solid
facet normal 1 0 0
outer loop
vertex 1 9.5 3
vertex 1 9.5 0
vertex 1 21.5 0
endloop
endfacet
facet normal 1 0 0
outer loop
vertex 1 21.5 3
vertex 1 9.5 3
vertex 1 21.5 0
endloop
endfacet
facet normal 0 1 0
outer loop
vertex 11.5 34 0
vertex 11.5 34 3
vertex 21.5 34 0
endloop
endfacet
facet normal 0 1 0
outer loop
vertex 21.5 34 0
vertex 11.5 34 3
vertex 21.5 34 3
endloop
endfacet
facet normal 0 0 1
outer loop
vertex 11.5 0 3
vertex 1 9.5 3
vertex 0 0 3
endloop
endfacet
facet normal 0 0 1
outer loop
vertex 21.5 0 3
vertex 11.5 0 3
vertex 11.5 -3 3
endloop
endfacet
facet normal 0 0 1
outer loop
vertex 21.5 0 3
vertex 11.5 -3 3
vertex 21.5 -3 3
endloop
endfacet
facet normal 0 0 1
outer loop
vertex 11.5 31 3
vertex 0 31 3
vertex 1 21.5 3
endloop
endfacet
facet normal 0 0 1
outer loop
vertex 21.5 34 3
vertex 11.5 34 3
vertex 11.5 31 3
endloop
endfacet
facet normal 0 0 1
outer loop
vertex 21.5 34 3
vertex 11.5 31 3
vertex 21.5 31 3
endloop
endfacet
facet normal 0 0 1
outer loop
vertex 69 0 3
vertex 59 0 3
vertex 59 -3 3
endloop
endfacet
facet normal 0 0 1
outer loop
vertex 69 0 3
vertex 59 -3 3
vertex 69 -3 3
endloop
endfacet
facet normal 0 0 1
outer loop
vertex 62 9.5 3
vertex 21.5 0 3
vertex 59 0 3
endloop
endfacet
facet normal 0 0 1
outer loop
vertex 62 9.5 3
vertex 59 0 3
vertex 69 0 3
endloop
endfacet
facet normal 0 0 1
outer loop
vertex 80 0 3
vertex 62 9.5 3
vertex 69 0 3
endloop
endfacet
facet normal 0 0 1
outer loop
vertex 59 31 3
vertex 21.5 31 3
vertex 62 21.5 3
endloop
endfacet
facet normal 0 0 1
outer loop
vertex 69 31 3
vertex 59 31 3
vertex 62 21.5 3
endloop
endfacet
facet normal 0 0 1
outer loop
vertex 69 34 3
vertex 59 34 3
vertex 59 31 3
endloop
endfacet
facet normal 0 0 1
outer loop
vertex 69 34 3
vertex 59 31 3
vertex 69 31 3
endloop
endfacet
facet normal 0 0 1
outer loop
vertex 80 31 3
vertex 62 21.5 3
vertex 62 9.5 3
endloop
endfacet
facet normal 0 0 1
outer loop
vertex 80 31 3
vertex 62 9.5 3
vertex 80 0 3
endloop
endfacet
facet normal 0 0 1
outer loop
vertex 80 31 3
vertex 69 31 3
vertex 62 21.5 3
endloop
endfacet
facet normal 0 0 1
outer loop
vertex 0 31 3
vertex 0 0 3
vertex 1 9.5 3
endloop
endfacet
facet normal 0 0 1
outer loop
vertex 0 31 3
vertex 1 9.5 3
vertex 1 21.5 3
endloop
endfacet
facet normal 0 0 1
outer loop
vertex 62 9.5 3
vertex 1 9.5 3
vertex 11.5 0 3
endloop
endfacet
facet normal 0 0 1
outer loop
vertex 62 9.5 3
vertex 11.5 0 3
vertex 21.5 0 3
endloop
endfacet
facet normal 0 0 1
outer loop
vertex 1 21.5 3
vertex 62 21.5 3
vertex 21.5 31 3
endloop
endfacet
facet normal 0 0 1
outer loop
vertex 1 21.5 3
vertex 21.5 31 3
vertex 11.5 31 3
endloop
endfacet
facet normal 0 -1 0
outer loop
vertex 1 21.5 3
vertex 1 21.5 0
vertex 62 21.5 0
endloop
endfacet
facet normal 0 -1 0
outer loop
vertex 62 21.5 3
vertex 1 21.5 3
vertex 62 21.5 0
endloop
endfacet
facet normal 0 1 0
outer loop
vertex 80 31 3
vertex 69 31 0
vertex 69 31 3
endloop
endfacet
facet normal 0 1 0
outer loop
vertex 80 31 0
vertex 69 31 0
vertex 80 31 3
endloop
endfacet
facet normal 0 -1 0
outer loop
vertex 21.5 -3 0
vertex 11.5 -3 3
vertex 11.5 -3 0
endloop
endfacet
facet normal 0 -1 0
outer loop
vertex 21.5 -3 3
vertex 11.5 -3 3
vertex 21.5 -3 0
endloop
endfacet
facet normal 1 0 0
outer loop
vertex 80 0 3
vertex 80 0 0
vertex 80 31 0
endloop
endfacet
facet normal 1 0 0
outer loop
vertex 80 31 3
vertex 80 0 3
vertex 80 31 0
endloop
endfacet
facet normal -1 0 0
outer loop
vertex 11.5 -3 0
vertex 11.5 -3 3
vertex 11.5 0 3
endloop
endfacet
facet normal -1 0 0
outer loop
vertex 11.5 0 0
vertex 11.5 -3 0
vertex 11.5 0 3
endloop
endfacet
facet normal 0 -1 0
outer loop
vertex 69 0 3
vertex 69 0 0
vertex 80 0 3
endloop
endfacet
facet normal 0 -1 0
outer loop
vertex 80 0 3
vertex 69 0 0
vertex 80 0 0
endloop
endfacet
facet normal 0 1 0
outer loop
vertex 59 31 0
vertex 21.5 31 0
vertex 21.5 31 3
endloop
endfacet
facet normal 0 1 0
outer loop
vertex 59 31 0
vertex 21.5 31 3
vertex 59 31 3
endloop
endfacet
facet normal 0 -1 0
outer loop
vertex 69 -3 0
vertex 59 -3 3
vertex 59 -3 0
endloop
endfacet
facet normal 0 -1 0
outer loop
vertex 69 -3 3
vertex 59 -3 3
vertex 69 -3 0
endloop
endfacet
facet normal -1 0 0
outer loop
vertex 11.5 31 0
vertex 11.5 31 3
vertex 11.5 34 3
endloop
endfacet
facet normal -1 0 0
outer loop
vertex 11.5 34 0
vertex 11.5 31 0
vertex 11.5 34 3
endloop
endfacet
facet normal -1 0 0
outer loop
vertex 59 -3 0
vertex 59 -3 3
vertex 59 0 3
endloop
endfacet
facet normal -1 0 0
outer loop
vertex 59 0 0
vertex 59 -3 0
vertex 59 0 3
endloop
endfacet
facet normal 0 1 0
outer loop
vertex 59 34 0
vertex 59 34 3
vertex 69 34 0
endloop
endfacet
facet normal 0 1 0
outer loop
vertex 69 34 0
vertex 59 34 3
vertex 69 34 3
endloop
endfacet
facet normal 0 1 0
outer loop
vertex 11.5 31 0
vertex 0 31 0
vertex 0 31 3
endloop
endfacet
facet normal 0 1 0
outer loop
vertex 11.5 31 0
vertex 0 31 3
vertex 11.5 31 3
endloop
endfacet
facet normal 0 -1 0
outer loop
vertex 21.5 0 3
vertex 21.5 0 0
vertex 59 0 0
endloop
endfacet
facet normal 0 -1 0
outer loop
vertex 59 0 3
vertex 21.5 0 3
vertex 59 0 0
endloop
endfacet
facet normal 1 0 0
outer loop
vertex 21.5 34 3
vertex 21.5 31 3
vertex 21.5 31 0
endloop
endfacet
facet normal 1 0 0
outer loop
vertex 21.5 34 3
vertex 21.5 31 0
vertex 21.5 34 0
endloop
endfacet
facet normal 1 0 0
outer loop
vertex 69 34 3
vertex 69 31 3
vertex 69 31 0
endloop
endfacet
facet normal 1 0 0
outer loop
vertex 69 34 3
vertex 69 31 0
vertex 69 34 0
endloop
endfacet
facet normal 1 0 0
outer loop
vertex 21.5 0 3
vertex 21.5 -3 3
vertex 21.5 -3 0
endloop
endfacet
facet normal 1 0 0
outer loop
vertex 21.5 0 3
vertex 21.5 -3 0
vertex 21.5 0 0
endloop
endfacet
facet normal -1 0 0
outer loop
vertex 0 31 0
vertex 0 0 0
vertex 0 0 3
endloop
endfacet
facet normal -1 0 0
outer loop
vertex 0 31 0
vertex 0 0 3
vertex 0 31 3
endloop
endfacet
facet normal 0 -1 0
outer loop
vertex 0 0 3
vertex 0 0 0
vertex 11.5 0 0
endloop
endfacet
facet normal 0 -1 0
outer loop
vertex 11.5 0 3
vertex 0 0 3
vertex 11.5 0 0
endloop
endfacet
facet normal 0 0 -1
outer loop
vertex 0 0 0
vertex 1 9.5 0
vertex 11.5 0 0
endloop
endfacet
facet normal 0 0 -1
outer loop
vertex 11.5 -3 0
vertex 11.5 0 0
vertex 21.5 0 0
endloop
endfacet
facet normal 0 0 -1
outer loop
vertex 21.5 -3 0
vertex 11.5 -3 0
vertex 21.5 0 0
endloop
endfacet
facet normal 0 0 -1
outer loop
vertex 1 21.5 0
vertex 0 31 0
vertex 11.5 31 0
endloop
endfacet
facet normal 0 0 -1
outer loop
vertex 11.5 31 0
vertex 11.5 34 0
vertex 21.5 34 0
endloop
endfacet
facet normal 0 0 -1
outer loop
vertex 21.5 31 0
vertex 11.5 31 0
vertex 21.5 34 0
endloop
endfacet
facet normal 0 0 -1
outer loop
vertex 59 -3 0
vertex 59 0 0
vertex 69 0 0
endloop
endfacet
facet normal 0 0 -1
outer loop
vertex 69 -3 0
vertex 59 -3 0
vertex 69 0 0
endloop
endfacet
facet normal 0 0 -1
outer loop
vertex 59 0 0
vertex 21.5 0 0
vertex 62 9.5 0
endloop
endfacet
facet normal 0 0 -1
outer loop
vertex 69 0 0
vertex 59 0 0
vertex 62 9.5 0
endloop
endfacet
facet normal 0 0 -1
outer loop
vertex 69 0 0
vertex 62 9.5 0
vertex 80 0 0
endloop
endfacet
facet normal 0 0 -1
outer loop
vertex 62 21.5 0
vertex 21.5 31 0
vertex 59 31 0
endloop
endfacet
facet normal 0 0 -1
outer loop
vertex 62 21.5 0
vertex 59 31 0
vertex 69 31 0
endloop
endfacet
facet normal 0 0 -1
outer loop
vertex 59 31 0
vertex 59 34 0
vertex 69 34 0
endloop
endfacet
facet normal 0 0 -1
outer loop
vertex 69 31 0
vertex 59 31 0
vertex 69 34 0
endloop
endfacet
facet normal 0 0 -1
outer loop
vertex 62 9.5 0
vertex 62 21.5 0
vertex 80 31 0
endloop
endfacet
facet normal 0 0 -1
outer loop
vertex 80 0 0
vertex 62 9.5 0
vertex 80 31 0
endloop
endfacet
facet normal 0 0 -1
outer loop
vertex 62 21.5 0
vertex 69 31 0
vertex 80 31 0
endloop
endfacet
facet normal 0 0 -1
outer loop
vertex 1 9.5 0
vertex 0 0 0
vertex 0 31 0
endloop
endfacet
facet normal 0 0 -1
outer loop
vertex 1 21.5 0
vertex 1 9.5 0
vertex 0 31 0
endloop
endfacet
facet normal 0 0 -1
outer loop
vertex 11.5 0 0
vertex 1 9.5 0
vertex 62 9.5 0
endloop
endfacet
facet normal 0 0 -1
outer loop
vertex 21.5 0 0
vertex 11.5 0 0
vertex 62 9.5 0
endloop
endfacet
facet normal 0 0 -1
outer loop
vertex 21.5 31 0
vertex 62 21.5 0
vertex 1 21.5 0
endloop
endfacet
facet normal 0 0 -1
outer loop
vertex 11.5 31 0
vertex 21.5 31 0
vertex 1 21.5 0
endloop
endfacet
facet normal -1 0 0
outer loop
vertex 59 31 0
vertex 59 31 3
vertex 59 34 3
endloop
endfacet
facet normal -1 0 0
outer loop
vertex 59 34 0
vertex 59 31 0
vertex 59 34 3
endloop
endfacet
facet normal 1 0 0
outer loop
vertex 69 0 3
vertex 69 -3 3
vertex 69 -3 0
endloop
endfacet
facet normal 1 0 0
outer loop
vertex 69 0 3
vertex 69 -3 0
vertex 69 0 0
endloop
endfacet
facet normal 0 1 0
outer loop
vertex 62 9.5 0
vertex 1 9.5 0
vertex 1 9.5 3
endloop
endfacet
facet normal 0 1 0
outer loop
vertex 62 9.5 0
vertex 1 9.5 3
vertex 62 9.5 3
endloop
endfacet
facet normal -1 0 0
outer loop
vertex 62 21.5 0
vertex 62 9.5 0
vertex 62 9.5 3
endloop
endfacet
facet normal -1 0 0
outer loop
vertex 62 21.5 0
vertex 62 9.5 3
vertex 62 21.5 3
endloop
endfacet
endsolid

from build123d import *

# Parameters (mm, degrees)
SKETCH_1_W      = 80
SKETCH_1_H      = 31
SKETCH_1_W_2    = 61
SKETCH_1_H_2    = 12
EXTRUDE_1_DEPTH = 3
SKETCH_2_W      = 10
SKETCH_2_H      = 3
EXTRUDE_2_DEPTH = 3


with BuildPart() as part:
    # 草图1 → 凸台-拉伸1 (new body)
    with BuildSketch(Plane.XY):
        with Locations((40, 15.5)):
            Rectangle(SKETCH_1_W, SKETCH_1_H)
        with Locations((31.5, 15.5)):
            Rectangle(SKETCH_1_W_2, SKETCH_1_H_2, mode=Mode.SUBTRACT)
    extrude(amount=EXTRUDE_1_DEPTH)

    # 草图2 → 凸台-拉伸2 (add)
    with BuildSketch(Plane.XY.offset(3)):
        with Locations((16.5, 32.5)):
            Rectangle(SKETCH_2_W, SKETCH_2_H)
        with Locations((64, 32.5)):
            Rectangle(SKETCH_2_W, SKETCH_2_H)
        with Locations((64, -1.5)):
            Rectangle(SKETCH_2_W, SKETCH_2_H)
        with Locations((16.5, -1.5)):
            Rectangle(SKETCH_2_W, SKETCH_2_H)
    extrude(amount=-EXTRUDE_2_DEPTH)


solid = part.part
